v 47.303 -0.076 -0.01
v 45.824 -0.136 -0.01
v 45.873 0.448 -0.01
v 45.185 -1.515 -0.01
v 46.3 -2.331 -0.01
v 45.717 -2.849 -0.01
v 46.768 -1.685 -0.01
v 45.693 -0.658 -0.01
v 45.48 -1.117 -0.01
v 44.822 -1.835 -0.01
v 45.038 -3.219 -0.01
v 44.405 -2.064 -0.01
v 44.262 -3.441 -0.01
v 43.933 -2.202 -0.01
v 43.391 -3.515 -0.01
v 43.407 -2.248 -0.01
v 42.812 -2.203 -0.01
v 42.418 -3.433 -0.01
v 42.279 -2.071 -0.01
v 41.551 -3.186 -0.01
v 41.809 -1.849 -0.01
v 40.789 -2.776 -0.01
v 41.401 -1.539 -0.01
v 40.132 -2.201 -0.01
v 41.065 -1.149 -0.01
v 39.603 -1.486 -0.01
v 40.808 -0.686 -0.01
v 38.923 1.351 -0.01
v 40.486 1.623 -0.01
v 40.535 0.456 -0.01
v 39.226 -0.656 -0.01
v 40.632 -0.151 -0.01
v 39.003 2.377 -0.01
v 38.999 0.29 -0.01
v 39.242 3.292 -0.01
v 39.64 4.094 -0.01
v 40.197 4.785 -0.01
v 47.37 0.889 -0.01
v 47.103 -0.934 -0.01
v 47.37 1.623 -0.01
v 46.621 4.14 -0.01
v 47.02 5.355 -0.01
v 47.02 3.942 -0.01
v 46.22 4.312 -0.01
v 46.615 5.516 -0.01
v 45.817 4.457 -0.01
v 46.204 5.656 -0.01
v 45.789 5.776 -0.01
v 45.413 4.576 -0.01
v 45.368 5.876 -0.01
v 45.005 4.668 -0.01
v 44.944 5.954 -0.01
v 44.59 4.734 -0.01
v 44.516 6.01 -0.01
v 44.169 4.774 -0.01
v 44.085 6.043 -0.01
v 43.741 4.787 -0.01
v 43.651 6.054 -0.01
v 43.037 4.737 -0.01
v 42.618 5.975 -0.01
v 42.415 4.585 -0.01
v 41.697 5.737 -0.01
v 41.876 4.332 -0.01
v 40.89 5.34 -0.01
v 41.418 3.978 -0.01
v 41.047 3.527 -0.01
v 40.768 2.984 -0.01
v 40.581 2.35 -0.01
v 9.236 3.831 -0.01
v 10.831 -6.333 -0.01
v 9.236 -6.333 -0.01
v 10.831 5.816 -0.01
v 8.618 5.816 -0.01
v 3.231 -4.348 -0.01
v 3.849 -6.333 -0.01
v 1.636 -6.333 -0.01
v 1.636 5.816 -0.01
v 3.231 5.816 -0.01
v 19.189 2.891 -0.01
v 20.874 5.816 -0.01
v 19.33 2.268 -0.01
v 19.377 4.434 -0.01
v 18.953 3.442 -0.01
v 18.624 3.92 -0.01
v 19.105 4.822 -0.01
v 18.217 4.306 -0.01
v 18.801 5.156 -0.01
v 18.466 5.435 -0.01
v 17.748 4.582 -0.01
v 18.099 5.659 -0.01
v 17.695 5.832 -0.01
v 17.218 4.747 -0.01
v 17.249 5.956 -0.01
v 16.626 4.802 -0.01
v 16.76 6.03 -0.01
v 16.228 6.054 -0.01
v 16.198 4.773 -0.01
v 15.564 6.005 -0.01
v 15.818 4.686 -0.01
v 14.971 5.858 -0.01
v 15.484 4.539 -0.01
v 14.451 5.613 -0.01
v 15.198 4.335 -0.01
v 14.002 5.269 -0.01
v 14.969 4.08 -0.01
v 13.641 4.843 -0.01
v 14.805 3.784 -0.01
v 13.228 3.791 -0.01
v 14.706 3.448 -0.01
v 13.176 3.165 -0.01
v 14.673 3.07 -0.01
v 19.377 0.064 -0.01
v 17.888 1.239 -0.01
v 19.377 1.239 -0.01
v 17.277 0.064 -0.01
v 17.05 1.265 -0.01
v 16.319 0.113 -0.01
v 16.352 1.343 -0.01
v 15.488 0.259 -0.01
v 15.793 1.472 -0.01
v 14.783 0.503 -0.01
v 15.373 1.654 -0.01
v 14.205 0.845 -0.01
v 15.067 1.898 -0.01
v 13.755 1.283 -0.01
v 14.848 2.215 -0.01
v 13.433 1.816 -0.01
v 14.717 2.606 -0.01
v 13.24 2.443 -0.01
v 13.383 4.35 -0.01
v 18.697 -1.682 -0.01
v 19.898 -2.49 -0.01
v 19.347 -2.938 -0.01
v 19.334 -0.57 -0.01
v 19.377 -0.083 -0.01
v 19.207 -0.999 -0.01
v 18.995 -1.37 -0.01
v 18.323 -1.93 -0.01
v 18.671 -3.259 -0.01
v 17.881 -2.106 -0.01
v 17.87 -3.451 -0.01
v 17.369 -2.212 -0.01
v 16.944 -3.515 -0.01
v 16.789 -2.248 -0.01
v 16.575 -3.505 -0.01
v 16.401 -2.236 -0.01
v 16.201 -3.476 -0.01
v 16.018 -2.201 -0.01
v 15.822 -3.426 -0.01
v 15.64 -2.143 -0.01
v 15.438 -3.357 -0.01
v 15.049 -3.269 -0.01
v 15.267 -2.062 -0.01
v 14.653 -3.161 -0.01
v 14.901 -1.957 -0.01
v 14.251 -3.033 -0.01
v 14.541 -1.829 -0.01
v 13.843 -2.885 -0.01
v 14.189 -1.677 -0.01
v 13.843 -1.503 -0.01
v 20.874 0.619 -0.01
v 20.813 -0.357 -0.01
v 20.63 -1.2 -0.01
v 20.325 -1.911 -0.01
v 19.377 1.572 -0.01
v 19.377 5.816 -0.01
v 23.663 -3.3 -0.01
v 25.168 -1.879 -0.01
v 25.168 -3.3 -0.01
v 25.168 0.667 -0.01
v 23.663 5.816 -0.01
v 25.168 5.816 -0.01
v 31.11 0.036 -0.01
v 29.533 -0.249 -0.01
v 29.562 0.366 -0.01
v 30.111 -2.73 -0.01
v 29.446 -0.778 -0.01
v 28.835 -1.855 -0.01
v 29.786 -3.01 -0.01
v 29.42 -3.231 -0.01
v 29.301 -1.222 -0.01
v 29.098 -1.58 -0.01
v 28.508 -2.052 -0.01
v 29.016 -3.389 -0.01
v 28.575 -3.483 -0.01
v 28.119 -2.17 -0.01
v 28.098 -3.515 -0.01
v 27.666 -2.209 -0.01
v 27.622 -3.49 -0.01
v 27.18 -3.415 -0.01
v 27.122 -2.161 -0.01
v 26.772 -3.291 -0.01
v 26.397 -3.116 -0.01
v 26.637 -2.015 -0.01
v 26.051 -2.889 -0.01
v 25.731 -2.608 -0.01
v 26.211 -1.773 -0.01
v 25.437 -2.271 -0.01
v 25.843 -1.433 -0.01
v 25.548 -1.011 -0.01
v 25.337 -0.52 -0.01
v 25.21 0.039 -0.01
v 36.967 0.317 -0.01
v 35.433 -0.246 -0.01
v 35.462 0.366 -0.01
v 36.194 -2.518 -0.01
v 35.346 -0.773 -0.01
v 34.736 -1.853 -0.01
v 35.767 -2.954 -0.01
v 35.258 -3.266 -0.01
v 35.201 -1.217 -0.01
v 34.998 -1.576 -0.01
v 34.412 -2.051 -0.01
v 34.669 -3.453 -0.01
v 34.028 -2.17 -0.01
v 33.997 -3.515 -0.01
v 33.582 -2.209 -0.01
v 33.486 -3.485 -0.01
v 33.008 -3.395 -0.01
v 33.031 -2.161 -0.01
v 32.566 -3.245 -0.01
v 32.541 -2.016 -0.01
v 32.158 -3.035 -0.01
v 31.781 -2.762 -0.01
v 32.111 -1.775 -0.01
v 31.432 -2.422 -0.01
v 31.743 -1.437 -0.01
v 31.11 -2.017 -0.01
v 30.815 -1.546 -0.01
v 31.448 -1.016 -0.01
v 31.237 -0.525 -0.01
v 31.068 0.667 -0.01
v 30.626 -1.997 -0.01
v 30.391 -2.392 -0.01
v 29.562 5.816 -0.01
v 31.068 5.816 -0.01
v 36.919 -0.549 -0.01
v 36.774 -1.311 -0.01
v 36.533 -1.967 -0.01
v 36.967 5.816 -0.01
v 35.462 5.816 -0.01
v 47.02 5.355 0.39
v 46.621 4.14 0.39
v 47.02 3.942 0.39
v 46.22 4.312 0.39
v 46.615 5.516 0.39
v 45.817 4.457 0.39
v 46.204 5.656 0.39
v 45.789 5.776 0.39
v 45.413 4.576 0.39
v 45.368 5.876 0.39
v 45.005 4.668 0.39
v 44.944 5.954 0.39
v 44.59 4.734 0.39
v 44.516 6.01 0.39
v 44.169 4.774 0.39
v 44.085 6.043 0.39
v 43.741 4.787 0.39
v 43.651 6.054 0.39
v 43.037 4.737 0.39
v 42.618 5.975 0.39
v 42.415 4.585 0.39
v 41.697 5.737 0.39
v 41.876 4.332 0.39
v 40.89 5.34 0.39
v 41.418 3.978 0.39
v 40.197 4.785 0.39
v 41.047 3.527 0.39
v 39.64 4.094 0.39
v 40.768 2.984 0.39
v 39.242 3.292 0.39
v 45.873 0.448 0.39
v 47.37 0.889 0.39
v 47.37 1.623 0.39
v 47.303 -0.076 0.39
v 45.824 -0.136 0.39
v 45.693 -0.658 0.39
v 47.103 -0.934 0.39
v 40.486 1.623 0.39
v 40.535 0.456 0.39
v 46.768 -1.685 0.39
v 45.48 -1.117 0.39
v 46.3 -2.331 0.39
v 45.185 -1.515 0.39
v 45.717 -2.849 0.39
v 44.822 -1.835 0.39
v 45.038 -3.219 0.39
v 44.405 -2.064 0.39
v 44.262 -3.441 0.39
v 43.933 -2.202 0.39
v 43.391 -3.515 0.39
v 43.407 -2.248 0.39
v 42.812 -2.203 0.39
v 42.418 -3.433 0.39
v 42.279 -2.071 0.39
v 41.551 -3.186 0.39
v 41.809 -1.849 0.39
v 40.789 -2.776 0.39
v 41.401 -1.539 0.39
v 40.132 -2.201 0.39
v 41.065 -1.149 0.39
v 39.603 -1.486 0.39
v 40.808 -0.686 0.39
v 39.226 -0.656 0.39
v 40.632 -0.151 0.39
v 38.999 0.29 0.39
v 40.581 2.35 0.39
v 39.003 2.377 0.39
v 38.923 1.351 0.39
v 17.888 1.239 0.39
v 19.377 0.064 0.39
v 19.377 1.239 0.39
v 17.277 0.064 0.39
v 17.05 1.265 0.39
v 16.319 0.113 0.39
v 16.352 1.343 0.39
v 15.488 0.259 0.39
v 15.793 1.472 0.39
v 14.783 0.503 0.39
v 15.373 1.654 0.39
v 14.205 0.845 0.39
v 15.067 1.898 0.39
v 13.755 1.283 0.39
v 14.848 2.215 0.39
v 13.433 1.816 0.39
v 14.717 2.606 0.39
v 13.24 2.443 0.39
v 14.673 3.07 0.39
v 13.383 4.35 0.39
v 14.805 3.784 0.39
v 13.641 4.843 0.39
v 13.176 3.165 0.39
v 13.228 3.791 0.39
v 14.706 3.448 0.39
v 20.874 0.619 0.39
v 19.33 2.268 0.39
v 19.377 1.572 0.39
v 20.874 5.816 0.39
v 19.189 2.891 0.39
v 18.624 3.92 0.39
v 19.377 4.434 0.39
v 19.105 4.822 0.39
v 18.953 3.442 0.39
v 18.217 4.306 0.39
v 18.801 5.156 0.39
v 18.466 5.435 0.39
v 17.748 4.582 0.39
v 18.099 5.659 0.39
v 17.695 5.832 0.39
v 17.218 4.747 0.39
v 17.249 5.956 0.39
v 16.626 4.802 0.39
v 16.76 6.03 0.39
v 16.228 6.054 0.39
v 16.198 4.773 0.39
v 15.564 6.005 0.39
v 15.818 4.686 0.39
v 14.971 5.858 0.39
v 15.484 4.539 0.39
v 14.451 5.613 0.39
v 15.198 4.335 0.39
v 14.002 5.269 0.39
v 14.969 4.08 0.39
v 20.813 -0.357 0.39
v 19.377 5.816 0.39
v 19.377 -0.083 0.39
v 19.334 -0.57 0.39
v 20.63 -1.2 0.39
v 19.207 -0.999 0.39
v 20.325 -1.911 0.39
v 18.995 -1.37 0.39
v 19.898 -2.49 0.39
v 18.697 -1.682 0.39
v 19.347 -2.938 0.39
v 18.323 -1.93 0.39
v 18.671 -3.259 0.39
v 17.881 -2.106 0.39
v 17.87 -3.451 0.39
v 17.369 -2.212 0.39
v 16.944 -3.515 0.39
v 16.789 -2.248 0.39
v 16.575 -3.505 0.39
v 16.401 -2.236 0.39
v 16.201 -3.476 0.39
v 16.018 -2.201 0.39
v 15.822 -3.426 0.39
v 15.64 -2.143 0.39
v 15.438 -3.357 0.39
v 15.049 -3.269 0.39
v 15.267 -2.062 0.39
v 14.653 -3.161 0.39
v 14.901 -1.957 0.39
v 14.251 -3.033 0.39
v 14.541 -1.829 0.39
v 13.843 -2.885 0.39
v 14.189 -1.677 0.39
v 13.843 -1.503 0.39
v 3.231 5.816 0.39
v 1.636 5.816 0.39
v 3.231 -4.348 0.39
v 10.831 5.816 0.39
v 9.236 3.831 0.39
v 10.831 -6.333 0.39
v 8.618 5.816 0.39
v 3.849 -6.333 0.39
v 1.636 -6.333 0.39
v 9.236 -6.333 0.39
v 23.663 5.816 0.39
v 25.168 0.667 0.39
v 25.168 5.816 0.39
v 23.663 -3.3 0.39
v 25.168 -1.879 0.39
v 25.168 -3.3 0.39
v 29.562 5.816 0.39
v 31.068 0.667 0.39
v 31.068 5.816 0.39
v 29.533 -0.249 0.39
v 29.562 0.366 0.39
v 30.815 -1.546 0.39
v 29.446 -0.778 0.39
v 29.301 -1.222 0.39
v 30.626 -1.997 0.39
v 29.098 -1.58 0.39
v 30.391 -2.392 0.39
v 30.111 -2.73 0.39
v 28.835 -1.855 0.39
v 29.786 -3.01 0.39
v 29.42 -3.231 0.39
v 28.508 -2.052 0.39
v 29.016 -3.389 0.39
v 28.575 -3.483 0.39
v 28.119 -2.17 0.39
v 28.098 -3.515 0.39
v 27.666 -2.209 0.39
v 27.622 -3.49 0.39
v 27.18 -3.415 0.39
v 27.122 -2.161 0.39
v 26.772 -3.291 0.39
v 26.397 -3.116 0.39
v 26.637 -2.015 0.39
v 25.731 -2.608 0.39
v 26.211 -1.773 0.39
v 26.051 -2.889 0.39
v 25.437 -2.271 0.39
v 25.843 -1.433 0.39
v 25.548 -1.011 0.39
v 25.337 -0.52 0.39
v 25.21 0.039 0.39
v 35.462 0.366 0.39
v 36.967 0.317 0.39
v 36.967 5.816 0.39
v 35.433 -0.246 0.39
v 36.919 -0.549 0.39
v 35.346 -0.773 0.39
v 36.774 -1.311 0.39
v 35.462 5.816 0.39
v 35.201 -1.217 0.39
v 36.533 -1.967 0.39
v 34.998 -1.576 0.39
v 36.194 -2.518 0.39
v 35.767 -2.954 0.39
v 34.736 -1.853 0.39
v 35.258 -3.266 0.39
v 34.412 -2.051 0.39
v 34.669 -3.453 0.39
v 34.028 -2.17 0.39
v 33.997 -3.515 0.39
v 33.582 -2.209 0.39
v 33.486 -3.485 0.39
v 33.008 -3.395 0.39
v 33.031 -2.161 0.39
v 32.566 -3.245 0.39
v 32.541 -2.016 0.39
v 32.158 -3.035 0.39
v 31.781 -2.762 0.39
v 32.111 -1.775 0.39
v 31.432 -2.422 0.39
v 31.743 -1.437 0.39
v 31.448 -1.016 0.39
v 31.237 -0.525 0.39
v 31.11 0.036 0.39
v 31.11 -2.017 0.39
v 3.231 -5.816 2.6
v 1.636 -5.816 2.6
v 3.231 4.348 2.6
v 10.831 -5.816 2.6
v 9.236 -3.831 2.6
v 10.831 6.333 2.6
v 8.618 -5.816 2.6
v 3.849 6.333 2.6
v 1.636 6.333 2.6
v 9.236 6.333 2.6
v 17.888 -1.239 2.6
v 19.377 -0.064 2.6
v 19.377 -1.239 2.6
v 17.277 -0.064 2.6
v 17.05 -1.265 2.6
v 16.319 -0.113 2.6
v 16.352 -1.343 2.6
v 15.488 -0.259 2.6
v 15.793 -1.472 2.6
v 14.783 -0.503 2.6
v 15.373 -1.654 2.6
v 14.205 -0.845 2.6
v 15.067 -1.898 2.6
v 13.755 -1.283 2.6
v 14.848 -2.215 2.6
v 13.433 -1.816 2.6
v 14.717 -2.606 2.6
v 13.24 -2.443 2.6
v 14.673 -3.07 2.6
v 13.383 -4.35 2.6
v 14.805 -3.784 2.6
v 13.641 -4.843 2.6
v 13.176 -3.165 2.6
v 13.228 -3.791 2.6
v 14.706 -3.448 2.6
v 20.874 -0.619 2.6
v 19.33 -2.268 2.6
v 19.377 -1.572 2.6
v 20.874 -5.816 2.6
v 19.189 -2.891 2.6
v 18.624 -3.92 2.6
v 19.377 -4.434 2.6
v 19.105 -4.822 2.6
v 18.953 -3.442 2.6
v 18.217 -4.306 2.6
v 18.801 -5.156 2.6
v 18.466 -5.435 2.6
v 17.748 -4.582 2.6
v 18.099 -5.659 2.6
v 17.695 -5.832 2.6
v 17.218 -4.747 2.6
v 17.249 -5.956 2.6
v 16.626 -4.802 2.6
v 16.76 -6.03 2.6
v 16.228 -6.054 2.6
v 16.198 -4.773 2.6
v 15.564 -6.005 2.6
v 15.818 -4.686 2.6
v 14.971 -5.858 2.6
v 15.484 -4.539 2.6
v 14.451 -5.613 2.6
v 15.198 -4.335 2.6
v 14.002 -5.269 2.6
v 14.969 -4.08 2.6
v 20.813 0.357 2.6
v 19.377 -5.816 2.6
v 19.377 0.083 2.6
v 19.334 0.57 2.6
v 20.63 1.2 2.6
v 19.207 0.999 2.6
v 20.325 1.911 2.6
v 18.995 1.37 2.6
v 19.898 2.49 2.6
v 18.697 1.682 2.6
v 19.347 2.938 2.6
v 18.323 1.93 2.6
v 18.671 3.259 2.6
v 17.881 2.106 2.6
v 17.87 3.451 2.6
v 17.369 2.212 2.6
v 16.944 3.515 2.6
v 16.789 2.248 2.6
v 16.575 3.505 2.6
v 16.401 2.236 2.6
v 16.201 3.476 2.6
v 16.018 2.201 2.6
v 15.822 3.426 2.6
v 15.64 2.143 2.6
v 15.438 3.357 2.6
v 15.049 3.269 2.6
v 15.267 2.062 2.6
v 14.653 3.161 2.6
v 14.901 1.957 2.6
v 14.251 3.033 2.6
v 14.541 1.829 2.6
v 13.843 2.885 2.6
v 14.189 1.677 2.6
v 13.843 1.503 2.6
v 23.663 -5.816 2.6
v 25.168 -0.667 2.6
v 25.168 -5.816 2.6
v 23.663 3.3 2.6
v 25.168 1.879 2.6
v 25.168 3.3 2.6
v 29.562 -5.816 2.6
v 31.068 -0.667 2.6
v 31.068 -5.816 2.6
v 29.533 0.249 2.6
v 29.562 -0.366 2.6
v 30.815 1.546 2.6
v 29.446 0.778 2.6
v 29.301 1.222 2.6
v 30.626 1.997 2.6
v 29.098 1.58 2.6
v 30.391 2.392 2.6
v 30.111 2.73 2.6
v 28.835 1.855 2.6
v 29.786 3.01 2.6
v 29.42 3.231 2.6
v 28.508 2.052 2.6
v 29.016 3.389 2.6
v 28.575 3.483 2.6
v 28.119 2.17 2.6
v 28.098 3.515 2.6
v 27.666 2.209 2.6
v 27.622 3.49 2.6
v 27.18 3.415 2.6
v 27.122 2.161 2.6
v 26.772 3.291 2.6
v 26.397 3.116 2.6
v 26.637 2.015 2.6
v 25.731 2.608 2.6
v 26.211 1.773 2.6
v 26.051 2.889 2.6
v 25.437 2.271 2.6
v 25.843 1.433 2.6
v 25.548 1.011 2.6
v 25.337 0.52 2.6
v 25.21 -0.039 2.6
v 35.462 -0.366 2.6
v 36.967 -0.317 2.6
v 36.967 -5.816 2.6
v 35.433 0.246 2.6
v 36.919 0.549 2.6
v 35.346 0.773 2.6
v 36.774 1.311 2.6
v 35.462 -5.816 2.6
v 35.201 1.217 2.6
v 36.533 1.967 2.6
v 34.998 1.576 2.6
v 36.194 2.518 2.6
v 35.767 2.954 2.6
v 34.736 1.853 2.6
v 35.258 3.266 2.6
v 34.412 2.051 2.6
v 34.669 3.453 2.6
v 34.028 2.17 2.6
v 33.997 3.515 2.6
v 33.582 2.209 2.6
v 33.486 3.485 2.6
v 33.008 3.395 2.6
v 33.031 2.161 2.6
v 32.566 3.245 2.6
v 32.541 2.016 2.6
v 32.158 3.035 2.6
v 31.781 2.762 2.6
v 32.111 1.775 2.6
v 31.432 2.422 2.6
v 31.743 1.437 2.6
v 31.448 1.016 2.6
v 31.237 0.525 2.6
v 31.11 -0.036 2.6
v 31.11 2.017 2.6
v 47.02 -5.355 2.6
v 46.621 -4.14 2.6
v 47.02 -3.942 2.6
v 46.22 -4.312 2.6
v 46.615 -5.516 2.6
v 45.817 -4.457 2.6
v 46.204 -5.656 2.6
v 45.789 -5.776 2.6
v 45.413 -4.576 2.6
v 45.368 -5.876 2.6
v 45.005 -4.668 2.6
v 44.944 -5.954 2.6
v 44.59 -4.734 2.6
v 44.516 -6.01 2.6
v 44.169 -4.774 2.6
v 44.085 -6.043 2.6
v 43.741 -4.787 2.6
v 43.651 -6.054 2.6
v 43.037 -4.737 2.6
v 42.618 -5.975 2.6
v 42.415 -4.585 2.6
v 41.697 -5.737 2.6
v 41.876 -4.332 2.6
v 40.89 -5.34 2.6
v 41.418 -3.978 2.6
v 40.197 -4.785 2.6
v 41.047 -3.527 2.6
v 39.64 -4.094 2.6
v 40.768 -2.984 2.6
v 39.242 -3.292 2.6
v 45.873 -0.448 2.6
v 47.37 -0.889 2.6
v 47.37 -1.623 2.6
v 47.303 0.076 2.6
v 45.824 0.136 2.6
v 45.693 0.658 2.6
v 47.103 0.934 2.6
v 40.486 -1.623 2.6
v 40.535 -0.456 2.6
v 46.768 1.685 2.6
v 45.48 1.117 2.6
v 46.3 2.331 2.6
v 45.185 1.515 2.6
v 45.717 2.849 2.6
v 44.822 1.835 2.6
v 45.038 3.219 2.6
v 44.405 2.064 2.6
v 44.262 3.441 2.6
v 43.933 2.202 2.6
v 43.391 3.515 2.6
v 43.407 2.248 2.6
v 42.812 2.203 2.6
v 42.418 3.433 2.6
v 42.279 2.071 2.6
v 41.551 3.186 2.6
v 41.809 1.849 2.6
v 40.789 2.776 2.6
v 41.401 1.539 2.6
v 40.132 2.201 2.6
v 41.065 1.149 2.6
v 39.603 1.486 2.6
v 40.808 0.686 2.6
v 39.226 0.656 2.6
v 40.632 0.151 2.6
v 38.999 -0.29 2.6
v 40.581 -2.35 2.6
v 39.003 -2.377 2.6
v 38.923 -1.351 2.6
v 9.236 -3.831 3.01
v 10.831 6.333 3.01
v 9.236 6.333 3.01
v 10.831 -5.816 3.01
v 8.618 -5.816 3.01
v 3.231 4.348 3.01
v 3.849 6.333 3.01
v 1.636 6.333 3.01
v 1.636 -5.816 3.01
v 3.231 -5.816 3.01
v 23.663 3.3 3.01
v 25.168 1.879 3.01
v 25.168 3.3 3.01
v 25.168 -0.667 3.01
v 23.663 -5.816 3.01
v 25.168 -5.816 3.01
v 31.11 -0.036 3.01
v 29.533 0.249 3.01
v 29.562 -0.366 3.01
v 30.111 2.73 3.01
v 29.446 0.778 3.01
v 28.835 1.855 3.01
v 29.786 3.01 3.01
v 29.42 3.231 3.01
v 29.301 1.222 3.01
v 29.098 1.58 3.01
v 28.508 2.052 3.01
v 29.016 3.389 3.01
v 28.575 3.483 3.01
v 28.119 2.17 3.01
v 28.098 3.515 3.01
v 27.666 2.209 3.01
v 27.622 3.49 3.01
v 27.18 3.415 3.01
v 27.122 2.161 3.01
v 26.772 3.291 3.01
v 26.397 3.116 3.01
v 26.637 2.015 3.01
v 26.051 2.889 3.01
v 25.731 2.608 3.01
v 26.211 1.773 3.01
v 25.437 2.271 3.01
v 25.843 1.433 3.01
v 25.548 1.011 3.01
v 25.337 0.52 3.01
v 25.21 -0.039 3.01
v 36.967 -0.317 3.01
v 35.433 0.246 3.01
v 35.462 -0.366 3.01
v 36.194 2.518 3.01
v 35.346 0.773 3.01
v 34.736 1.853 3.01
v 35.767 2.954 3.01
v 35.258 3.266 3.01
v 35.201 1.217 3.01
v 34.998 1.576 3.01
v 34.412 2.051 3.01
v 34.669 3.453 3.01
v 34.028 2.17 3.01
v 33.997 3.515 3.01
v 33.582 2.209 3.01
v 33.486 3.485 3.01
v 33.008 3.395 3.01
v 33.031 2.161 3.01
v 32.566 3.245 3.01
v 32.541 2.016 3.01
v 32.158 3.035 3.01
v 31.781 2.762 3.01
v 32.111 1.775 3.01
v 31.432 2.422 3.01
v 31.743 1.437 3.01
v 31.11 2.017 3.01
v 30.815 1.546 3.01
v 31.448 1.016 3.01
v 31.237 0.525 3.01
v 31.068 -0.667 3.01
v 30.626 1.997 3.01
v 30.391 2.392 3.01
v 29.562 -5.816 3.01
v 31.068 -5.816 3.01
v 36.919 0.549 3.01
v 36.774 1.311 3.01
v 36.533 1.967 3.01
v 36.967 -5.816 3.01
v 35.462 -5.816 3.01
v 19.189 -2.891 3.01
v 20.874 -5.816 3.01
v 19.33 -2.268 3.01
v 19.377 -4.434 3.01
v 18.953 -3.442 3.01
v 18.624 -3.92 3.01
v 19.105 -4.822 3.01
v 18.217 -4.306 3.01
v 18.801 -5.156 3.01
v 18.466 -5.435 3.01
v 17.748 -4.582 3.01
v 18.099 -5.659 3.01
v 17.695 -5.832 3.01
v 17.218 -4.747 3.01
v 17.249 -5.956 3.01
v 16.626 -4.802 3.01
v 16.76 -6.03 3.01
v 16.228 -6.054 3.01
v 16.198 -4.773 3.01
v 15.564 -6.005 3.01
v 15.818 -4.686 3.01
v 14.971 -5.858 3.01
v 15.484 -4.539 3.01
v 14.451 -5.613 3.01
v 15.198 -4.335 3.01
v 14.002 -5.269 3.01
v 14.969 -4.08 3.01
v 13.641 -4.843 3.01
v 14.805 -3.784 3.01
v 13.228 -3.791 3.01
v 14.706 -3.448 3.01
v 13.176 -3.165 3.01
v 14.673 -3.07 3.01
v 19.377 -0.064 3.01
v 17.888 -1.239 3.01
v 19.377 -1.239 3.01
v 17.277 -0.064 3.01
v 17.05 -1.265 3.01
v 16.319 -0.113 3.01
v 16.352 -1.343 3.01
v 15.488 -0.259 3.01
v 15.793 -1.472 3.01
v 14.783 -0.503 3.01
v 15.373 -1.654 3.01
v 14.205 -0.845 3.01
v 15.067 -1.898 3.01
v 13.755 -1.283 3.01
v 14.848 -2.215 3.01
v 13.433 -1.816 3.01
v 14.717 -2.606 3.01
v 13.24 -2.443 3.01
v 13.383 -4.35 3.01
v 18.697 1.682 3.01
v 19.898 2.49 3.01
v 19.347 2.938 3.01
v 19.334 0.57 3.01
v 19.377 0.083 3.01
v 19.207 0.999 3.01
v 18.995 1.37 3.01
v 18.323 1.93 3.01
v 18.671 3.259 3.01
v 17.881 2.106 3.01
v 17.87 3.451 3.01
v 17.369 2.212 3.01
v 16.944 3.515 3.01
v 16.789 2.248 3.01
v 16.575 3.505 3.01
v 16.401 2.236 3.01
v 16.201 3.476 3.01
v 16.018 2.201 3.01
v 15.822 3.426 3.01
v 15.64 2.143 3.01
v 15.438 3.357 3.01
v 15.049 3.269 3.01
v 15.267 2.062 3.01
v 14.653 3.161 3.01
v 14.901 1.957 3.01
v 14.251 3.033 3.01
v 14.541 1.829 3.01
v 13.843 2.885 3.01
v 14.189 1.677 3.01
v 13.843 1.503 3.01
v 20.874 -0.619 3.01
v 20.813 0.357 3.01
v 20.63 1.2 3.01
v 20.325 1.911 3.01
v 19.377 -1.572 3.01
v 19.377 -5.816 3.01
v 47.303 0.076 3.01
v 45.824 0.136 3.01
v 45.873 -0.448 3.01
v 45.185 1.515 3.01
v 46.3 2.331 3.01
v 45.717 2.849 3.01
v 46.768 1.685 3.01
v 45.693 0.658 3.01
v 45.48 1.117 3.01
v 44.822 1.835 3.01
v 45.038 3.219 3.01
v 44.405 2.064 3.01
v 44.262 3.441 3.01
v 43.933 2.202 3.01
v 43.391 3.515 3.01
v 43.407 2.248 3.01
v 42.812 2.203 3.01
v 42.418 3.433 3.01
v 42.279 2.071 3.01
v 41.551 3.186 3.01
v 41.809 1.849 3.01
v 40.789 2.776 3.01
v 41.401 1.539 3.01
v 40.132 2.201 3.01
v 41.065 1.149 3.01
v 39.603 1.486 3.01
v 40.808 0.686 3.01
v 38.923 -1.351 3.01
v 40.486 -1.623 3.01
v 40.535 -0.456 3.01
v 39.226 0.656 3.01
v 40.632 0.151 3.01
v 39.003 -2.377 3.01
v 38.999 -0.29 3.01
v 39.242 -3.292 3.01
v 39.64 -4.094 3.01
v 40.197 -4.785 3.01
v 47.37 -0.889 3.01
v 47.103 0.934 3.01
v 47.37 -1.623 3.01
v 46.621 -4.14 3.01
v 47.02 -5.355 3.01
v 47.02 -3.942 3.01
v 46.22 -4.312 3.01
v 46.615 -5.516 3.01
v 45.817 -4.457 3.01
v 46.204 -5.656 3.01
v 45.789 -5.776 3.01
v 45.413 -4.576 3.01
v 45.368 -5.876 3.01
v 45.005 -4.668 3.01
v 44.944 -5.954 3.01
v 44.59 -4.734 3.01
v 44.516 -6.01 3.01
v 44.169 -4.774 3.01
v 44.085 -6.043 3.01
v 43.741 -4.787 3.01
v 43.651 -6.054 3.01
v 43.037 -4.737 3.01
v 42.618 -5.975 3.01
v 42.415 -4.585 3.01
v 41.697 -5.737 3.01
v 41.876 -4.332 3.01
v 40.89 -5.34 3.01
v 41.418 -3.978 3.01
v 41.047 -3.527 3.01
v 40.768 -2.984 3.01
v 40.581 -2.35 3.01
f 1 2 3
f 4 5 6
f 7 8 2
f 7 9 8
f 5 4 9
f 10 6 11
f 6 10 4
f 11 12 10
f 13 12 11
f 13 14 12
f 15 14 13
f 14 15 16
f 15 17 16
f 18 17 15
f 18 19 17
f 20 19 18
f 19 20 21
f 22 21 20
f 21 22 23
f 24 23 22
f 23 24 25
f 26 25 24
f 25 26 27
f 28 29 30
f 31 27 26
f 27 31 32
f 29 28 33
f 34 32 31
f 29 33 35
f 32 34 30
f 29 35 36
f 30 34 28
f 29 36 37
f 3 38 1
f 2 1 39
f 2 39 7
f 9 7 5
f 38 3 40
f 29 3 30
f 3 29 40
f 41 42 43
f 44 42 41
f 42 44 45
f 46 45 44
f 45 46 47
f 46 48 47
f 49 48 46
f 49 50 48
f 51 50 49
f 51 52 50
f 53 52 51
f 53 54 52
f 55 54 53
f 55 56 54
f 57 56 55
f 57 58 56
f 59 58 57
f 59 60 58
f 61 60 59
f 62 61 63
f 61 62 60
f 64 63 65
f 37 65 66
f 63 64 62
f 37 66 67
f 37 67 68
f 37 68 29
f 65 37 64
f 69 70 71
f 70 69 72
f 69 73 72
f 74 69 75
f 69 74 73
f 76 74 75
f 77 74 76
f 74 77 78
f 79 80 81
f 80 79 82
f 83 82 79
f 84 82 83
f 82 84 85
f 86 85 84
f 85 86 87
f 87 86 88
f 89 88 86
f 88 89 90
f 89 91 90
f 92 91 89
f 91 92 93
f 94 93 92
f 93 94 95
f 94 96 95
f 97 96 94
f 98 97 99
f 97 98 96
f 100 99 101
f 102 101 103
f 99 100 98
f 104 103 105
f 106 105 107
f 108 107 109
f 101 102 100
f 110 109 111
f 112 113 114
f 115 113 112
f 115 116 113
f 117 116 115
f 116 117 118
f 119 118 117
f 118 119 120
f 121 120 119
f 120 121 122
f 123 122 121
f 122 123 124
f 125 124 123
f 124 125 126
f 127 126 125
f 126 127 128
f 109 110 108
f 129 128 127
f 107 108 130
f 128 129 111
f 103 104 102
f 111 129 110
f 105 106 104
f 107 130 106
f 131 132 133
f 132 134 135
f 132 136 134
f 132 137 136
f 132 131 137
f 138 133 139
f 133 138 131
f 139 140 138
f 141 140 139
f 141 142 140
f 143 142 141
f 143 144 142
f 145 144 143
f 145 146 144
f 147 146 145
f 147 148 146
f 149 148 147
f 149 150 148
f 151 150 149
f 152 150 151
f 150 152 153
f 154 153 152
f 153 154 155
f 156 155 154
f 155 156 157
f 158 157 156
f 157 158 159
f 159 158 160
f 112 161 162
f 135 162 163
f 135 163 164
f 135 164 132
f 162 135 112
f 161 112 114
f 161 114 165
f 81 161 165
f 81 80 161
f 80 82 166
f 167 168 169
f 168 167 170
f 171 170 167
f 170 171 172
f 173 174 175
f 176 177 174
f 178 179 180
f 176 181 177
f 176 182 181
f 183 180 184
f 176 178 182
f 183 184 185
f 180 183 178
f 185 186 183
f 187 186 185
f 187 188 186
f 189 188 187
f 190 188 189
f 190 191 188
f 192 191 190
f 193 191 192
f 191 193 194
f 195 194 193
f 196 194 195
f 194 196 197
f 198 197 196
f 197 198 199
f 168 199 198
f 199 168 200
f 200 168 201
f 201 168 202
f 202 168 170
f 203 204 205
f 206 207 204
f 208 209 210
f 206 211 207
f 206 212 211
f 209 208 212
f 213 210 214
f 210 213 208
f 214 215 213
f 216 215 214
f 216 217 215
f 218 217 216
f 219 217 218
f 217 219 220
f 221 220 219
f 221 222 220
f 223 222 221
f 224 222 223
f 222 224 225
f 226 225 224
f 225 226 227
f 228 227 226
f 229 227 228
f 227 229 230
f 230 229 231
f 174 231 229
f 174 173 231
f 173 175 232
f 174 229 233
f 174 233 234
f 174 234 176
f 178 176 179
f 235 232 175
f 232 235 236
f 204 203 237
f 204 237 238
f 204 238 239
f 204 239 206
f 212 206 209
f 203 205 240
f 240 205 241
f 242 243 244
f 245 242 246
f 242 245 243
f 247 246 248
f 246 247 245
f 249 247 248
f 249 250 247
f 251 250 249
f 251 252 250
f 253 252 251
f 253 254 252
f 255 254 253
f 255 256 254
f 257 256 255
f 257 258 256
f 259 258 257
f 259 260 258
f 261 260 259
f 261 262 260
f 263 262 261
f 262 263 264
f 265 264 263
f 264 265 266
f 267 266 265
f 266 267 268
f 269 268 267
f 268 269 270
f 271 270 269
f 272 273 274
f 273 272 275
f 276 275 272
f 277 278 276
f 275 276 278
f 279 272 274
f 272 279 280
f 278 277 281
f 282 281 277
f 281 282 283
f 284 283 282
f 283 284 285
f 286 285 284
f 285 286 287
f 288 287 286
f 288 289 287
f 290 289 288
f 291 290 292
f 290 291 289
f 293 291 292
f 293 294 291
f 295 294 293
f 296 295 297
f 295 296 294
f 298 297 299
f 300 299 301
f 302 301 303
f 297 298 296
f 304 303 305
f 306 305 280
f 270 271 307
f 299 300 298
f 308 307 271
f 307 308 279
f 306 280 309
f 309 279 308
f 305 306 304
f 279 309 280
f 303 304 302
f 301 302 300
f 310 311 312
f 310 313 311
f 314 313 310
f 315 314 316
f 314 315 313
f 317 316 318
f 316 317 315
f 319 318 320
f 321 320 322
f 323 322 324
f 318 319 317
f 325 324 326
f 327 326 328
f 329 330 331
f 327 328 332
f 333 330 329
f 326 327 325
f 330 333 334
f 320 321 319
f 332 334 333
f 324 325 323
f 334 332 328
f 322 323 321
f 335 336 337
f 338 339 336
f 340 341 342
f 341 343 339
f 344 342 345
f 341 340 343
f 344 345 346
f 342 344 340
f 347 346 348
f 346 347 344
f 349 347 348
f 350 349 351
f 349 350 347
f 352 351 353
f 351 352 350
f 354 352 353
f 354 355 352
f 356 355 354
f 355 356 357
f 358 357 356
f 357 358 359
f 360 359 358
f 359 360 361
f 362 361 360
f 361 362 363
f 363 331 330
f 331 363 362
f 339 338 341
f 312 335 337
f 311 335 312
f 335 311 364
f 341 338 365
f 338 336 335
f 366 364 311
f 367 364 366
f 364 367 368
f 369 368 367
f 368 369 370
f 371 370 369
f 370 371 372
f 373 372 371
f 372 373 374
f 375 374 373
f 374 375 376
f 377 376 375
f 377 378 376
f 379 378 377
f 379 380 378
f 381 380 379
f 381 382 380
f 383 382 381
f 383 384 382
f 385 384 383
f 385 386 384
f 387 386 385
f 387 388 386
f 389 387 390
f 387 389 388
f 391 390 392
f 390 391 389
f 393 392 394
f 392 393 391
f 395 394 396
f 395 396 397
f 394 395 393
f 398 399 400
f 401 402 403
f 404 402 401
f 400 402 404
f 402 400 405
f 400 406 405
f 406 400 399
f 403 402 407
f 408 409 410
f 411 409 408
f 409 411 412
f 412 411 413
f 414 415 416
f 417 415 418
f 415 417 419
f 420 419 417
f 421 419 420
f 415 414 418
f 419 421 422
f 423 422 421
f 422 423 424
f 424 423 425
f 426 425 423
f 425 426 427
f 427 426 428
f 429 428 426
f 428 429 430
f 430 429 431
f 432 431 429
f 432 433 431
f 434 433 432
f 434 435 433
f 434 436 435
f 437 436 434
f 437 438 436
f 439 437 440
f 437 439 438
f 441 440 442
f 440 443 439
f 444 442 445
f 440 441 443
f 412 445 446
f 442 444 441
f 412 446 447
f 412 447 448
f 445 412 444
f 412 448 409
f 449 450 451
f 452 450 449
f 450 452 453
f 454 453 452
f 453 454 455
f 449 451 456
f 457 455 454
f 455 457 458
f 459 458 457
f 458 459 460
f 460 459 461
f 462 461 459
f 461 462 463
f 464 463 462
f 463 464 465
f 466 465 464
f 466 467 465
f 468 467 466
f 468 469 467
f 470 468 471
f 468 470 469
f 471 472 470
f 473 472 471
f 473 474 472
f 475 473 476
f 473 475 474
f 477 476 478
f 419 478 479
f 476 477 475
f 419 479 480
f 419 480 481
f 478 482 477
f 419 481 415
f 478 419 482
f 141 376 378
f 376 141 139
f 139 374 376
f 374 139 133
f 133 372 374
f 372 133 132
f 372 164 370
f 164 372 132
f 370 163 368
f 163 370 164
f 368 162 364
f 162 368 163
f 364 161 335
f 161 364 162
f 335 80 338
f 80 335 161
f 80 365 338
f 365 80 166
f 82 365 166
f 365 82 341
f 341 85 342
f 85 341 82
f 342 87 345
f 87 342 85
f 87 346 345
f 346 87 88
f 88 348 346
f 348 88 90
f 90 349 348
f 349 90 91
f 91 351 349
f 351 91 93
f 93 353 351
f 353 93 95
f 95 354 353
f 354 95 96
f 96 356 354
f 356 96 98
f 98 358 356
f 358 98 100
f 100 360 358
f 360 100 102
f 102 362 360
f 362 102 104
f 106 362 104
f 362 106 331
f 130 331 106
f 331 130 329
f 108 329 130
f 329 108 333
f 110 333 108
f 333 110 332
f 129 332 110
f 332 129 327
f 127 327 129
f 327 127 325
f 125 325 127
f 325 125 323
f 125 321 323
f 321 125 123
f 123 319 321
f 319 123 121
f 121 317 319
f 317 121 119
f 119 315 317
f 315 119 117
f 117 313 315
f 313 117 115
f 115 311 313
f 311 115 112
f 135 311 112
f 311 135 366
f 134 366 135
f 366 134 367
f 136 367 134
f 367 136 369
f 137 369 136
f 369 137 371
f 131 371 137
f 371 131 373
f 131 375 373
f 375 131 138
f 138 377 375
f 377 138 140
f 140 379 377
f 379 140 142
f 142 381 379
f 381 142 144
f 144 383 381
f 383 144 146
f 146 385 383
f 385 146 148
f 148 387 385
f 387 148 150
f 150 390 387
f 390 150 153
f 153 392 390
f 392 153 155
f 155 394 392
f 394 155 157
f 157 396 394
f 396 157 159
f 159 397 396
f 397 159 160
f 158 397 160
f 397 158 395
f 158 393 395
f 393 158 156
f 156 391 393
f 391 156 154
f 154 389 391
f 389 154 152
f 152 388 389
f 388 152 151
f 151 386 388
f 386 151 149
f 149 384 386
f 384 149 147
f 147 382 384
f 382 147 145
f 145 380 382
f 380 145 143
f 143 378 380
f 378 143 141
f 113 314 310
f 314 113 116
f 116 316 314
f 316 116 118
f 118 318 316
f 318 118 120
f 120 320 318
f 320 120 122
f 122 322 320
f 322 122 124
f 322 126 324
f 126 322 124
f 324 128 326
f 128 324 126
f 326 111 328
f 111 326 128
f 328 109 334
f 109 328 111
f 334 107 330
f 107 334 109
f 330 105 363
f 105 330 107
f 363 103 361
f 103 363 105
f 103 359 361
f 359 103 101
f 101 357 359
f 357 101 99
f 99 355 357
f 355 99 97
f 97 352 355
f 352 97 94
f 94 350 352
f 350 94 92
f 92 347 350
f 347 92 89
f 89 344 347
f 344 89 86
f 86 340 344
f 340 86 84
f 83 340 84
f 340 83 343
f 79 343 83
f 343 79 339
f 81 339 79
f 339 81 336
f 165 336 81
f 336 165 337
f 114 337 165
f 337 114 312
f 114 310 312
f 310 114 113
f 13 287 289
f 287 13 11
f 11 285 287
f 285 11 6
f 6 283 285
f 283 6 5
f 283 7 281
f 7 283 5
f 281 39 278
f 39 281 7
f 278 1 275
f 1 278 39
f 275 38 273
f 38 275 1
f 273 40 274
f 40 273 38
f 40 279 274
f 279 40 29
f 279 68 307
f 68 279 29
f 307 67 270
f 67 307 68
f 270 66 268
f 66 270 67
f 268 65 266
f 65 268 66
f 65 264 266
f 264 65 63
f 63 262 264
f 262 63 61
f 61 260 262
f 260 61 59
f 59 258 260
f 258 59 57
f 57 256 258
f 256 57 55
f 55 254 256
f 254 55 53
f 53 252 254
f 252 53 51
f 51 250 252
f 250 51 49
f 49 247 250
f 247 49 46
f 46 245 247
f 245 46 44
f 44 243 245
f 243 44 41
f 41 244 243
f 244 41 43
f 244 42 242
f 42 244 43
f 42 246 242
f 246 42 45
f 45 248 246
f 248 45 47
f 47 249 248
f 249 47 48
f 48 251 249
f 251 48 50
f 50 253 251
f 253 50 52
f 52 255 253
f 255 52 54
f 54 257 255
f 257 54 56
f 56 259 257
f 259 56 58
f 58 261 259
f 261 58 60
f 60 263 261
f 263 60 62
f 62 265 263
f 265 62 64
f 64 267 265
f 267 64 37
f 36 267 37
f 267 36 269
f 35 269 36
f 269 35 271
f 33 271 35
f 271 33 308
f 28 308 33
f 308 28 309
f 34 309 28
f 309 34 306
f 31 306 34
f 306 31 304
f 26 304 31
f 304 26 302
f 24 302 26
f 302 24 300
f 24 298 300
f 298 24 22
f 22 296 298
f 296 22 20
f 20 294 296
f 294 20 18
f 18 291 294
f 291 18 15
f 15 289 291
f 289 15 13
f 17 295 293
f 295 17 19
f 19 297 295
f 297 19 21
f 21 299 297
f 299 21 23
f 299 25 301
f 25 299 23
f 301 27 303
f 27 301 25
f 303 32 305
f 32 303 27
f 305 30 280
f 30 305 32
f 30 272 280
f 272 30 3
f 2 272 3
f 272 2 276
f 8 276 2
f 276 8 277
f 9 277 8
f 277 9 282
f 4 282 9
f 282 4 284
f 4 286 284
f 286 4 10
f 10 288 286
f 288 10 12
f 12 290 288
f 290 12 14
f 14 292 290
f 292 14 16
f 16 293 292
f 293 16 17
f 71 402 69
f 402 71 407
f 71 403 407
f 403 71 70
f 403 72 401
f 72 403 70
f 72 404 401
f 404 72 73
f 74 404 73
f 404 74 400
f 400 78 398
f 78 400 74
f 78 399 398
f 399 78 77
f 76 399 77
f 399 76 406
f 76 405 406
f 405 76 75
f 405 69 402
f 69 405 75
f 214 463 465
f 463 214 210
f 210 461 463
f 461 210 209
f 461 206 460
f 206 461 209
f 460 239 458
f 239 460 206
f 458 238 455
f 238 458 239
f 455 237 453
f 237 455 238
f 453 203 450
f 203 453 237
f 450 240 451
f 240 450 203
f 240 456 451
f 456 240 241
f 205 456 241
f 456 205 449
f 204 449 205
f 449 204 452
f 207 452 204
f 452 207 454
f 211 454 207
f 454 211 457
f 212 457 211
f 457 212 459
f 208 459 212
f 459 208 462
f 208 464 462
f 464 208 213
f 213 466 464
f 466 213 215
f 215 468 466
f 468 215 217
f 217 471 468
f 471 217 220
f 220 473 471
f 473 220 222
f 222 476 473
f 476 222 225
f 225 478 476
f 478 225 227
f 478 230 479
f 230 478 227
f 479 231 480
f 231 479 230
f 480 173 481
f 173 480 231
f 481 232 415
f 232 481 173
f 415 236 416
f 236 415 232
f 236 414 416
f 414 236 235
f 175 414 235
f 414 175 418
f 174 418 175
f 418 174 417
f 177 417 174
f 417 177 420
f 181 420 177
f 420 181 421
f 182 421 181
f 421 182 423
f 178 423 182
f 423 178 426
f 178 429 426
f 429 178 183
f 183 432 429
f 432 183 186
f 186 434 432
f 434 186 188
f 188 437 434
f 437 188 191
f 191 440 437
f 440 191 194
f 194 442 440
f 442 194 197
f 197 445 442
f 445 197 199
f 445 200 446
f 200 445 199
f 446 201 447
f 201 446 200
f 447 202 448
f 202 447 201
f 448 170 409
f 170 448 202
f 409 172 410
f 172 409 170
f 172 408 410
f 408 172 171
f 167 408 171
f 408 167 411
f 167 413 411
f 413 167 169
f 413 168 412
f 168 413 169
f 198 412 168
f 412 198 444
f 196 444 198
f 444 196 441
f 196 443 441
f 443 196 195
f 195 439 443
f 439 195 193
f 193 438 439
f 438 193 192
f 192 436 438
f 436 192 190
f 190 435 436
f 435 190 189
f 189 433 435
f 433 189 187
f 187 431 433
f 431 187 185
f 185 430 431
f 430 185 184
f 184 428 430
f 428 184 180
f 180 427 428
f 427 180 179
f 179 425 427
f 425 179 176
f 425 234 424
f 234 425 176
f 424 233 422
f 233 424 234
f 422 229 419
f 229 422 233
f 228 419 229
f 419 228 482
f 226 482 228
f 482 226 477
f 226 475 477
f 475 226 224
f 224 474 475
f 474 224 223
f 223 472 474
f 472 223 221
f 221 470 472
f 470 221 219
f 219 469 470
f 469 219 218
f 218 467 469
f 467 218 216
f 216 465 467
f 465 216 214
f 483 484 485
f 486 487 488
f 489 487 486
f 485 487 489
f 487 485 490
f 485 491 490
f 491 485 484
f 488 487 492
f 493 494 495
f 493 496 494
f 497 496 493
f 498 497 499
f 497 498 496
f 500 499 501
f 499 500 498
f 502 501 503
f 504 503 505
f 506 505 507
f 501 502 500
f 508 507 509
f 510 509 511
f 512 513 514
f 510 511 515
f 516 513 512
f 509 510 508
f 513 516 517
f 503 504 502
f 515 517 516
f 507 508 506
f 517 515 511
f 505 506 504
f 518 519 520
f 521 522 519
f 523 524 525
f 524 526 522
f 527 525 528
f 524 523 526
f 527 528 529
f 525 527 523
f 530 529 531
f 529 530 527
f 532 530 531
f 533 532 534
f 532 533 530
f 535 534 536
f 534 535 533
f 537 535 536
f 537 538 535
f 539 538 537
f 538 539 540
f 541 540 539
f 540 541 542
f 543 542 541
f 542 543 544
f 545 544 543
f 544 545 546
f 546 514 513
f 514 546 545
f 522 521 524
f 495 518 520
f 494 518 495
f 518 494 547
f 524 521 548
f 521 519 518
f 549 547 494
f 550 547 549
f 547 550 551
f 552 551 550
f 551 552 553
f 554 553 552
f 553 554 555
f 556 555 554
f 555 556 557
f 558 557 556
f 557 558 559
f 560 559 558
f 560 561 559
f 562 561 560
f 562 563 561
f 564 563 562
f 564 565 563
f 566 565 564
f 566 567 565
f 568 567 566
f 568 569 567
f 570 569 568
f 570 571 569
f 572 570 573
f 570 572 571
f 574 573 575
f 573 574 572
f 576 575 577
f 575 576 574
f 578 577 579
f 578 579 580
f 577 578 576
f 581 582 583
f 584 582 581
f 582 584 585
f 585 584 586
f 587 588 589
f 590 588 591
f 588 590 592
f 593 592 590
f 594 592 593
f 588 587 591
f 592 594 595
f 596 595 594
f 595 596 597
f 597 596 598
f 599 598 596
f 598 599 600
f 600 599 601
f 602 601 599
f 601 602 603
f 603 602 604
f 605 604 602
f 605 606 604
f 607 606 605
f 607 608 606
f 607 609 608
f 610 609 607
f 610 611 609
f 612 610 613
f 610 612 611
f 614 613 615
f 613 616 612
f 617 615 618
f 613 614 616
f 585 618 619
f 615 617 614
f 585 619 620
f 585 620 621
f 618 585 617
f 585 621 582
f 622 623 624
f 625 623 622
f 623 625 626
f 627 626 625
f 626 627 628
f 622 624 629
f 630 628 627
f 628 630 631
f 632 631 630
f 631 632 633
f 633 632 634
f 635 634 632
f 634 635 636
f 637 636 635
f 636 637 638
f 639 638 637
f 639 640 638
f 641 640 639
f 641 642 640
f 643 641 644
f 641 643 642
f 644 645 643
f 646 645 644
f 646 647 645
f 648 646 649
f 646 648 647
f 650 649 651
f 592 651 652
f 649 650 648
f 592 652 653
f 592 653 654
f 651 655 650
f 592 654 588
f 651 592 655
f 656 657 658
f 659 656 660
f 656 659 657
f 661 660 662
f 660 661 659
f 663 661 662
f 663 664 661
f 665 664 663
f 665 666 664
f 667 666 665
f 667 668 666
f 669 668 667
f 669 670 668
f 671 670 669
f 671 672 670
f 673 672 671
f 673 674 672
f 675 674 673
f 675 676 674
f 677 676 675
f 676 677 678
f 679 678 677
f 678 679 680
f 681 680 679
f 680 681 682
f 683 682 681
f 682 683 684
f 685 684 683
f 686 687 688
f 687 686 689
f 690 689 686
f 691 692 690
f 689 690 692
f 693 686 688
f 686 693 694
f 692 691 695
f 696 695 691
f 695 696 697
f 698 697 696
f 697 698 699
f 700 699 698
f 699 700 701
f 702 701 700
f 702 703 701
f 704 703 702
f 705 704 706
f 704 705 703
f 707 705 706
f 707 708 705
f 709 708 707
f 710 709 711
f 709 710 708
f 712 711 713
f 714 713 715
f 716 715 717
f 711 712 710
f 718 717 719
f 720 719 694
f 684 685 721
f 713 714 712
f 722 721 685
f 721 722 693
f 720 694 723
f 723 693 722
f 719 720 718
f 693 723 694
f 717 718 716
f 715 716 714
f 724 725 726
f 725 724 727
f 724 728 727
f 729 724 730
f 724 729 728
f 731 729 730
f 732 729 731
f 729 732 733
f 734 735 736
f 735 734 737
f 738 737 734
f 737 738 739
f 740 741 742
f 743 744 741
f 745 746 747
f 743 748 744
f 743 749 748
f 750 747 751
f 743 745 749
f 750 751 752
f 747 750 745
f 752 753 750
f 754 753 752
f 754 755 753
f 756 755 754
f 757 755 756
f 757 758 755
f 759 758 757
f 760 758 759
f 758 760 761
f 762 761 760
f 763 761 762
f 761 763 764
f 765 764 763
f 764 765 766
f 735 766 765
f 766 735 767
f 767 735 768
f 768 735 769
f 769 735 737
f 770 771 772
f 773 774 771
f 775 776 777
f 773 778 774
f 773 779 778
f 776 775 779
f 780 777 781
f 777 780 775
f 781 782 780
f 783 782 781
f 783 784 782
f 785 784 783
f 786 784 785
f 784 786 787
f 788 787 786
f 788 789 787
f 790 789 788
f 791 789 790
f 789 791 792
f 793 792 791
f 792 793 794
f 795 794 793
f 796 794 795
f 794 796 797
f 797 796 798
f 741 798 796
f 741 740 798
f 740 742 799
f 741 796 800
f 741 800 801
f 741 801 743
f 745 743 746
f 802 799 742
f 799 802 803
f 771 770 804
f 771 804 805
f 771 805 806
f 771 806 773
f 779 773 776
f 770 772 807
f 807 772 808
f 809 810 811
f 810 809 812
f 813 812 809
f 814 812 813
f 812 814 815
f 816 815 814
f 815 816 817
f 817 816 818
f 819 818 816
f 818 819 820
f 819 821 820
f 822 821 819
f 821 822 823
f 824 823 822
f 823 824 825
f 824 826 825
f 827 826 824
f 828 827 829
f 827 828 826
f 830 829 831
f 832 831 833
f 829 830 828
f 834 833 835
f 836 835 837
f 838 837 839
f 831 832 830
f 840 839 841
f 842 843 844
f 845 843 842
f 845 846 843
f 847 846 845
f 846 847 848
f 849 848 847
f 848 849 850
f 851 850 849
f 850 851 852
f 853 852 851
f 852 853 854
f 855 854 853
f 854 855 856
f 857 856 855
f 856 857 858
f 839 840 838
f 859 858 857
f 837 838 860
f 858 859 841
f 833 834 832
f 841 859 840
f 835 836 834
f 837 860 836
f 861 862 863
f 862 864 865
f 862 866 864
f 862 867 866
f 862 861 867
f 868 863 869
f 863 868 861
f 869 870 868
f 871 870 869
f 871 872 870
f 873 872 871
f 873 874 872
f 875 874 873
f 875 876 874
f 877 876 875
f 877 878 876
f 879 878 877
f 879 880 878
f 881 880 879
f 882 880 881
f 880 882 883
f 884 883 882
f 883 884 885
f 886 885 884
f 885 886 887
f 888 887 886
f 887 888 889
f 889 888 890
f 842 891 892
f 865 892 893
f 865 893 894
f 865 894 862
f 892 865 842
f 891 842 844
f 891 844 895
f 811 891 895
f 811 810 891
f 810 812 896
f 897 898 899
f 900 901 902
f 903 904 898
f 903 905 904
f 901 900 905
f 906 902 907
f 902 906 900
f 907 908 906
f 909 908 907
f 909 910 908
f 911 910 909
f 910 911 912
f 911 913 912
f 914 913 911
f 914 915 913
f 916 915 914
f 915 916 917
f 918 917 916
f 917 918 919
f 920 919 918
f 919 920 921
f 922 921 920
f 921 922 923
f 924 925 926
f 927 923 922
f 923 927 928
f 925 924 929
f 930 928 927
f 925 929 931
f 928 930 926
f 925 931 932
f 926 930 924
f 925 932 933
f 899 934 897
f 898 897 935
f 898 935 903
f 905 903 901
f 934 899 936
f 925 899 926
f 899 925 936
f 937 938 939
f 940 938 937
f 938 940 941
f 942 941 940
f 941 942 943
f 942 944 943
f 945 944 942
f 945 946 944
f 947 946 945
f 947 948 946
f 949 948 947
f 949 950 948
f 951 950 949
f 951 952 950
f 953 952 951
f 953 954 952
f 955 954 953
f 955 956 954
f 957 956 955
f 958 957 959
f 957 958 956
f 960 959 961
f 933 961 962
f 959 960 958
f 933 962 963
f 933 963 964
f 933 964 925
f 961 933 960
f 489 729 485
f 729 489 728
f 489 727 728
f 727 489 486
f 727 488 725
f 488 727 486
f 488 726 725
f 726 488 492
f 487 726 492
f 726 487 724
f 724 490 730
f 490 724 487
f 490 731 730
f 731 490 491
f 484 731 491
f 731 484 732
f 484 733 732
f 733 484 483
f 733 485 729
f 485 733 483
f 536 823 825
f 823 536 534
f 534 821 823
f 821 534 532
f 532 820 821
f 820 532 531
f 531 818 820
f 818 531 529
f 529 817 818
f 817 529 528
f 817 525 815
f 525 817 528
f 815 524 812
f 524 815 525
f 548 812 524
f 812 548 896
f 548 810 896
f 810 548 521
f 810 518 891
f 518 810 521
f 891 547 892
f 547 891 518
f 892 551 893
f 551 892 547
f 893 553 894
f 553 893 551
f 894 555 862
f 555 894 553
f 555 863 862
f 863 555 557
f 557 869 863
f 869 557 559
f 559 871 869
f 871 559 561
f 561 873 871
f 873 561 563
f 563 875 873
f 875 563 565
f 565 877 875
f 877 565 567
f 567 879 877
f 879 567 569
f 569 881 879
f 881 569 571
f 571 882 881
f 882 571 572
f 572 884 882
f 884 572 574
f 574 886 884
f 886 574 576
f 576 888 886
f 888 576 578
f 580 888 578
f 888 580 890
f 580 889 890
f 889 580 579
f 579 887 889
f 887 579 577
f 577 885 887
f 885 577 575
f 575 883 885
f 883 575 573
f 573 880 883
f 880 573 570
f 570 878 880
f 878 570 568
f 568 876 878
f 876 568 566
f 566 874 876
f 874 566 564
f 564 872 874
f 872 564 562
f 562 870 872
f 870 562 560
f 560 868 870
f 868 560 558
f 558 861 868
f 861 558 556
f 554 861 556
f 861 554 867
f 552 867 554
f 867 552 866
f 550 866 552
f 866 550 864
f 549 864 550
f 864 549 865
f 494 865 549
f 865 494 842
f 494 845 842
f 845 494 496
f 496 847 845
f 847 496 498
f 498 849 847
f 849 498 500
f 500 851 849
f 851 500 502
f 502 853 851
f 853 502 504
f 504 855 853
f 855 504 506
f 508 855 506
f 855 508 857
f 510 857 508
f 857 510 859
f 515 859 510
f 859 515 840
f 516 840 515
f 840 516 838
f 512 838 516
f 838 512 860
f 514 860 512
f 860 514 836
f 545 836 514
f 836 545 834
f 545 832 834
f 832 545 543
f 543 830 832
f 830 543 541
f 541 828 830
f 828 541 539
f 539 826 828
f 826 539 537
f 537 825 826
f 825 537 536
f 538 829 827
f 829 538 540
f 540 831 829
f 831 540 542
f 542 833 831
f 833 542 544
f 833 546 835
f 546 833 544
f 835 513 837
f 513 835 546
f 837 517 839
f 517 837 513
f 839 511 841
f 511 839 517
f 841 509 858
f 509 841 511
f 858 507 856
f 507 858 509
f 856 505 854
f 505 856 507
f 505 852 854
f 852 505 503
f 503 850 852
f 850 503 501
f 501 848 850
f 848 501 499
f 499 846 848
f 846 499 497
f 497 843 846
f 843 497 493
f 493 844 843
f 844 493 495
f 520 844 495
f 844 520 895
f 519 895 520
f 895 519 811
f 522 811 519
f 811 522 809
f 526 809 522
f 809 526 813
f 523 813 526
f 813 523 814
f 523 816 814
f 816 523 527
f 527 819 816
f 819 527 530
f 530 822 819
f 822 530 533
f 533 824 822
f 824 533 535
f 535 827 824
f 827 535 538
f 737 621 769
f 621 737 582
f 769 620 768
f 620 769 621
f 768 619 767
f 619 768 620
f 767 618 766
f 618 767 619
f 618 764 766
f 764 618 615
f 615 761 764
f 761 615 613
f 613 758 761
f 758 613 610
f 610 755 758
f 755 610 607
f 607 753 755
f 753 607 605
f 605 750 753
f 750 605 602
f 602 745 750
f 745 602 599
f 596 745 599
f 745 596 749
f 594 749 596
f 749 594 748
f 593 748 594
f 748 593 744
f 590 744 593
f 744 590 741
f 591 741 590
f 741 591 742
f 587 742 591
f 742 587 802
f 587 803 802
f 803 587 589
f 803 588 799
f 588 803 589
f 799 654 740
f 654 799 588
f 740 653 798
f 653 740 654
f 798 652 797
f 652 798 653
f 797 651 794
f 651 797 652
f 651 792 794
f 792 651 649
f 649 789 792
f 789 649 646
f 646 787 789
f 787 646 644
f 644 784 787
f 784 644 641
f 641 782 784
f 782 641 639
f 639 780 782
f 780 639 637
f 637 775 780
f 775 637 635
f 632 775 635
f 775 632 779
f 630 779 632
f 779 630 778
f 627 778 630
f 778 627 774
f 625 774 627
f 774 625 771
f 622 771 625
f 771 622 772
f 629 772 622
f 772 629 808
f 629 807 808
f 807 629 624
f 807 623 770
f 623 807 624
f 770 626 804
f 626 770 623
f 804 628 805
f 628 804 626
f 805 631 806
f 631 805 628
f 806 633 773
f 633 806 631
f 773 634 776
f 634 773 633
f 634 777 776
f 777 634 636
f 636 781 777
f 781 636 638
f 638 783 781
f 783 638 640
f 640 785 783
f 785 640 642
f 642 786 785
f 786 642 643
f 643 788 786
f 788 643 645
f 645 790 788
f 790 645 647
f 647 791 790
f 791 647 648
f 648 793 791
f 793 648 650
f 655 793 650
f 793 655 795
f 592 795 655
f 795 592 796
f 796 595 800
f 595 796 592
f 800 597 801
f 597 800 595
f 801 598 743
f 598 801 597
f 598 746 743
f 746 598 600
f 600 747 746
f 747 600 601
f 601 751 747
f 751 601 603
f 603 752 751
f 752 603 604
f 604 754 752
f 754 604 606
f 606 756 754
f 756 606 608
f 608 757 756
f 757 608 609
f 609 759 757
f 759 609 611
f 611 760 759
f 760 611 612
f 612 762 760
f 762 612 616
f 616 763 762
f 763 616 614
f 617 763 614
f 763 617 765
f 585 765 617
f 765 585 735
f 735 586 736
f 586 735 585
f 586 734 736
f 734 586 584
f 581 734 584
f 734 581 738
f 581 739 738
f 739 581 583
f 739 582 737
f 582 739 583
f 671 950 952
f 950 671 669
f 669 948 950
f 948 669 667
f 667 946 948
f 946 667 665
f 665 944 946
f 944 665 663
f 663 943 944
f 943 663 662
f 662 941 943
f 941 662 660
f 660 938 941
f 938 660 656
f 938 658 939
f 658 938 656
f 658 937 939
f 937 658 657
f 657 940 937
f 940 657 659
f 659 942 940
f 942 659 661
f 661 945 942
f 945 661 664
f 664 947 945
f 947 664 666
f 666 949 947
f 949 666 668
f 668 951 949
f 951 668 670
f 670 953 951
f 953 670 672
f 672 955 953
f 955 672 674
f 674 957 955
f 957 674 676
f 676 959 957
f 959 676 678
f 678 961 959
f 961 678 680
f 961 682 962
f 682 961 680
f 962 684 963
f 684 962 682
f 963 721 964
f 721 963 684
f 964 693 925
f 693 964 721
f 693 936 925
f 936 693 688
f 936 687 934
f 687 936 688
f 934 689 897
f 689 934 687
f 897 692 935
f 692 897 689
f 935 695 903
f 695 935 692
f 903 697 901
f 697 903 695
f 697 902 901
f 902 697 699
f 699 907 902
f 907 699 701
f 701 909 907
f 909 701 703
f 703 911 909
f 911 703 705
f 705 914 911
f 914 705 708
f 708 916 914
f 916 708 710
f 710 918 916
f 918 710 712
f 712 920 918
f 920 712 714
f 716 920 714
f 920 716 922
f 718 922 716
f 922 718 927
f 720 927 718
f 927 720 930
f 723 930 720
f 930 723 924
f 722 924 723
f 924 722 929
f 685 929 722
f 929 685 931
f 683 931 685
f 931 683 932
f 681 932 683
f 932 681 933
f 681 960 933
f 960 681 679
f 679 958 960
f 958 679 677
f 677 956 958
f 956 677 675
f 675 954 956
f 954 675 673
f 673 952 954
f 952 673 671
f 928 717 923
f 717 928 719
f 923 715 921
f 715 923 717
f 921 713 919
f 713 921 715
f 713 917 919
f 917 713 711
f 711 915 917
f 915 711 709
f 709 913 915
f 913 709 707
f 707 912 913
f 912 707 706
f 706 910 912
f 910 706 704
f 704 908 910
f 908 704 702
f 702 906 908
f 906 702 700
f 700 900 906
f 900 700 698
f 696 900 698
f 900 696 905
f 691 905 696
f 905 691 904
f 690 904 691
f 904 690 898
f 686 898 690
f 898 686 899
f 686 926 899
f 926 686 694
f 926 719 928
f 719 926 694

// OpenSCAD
yourname="Name";
fontsize=12;
texthight=0.4;
framehight=3;
minkowski_radius=0.5;
minkowski_fn=7;
fontname="Pacifico"; // [Arial,Gloria Hallelujah, Pacifico, Courgette, Permanent Marker, Domine:Domine bold, Ultra, Bevan, Corben:Corben bold, Coustard:Coustard bold]
what_to_print="text";//[text,frame]



if (what_to_print == "frame"){
  union(){
    difference(){
      translate([0,0,minkowski_radius])minkowski($fn=minkowski_fn){
        union(){
          $fn=24;
          linear_extrude(height = framehight-minkowski_radius*2)rotate([180,0,0])offset(r = 4-minkowski_radius) maketext(yourname,fontsize,0);
          linear_extrude(height = framehight-minkowski_radius*2)rotate([180,0,0])offset(r = 4-minkowski_radius) rotate([180,0,0])maketext(yourname,fontsize,0);
          linear_extrude(height = framehight-minkowski_radius*2)ring();
        }
        sphere(r=minkowski_radius,$fn=minkowski_fn);
      }
      translate([0,0,-0.01])linear_extrude(height = texthight) rotate([180,0,0]) maketext(yourname,fontsize,0);
      translate([0,0,framehight-texthight])linear_extrude(height = texthight+0.01) maketext(yourname,fontsize,0);
    }
  }
}
      
if (what_to_print == "text"){
  union(){
    color("red")translate([0,0,-0.01])linear_extrude(height = texthight) rotate([180,0,0]) maketext(yourname,fontsize,0);
    color("red")translate([0,0,framehight-texthight])linear_extrude(height = texthight+0.01) maketext(yourname,fontsize,0);
  }
}



module maketext(zeichen,groesse,texthight){
  if (texthight > 0){
    color("red")linear_extrude(height = texthight) {
      text(zeichen, font = fontname, size = groesse, direction = "ltr",  spacing = 1, valign = "center");
    }
  }else{
    text(zeichen, font = fontname, size = groesse, direction = "ltr",  spacing = 1, valign = "center" );
  }
}
module ring(){
  difference(){
    hull(){
      translate([-8,0])circle(r=4);
      translate([0,0])circle(r=4);
    }
    translate([-8,0])circle(r=2+minkowski_radius);
  }
}
